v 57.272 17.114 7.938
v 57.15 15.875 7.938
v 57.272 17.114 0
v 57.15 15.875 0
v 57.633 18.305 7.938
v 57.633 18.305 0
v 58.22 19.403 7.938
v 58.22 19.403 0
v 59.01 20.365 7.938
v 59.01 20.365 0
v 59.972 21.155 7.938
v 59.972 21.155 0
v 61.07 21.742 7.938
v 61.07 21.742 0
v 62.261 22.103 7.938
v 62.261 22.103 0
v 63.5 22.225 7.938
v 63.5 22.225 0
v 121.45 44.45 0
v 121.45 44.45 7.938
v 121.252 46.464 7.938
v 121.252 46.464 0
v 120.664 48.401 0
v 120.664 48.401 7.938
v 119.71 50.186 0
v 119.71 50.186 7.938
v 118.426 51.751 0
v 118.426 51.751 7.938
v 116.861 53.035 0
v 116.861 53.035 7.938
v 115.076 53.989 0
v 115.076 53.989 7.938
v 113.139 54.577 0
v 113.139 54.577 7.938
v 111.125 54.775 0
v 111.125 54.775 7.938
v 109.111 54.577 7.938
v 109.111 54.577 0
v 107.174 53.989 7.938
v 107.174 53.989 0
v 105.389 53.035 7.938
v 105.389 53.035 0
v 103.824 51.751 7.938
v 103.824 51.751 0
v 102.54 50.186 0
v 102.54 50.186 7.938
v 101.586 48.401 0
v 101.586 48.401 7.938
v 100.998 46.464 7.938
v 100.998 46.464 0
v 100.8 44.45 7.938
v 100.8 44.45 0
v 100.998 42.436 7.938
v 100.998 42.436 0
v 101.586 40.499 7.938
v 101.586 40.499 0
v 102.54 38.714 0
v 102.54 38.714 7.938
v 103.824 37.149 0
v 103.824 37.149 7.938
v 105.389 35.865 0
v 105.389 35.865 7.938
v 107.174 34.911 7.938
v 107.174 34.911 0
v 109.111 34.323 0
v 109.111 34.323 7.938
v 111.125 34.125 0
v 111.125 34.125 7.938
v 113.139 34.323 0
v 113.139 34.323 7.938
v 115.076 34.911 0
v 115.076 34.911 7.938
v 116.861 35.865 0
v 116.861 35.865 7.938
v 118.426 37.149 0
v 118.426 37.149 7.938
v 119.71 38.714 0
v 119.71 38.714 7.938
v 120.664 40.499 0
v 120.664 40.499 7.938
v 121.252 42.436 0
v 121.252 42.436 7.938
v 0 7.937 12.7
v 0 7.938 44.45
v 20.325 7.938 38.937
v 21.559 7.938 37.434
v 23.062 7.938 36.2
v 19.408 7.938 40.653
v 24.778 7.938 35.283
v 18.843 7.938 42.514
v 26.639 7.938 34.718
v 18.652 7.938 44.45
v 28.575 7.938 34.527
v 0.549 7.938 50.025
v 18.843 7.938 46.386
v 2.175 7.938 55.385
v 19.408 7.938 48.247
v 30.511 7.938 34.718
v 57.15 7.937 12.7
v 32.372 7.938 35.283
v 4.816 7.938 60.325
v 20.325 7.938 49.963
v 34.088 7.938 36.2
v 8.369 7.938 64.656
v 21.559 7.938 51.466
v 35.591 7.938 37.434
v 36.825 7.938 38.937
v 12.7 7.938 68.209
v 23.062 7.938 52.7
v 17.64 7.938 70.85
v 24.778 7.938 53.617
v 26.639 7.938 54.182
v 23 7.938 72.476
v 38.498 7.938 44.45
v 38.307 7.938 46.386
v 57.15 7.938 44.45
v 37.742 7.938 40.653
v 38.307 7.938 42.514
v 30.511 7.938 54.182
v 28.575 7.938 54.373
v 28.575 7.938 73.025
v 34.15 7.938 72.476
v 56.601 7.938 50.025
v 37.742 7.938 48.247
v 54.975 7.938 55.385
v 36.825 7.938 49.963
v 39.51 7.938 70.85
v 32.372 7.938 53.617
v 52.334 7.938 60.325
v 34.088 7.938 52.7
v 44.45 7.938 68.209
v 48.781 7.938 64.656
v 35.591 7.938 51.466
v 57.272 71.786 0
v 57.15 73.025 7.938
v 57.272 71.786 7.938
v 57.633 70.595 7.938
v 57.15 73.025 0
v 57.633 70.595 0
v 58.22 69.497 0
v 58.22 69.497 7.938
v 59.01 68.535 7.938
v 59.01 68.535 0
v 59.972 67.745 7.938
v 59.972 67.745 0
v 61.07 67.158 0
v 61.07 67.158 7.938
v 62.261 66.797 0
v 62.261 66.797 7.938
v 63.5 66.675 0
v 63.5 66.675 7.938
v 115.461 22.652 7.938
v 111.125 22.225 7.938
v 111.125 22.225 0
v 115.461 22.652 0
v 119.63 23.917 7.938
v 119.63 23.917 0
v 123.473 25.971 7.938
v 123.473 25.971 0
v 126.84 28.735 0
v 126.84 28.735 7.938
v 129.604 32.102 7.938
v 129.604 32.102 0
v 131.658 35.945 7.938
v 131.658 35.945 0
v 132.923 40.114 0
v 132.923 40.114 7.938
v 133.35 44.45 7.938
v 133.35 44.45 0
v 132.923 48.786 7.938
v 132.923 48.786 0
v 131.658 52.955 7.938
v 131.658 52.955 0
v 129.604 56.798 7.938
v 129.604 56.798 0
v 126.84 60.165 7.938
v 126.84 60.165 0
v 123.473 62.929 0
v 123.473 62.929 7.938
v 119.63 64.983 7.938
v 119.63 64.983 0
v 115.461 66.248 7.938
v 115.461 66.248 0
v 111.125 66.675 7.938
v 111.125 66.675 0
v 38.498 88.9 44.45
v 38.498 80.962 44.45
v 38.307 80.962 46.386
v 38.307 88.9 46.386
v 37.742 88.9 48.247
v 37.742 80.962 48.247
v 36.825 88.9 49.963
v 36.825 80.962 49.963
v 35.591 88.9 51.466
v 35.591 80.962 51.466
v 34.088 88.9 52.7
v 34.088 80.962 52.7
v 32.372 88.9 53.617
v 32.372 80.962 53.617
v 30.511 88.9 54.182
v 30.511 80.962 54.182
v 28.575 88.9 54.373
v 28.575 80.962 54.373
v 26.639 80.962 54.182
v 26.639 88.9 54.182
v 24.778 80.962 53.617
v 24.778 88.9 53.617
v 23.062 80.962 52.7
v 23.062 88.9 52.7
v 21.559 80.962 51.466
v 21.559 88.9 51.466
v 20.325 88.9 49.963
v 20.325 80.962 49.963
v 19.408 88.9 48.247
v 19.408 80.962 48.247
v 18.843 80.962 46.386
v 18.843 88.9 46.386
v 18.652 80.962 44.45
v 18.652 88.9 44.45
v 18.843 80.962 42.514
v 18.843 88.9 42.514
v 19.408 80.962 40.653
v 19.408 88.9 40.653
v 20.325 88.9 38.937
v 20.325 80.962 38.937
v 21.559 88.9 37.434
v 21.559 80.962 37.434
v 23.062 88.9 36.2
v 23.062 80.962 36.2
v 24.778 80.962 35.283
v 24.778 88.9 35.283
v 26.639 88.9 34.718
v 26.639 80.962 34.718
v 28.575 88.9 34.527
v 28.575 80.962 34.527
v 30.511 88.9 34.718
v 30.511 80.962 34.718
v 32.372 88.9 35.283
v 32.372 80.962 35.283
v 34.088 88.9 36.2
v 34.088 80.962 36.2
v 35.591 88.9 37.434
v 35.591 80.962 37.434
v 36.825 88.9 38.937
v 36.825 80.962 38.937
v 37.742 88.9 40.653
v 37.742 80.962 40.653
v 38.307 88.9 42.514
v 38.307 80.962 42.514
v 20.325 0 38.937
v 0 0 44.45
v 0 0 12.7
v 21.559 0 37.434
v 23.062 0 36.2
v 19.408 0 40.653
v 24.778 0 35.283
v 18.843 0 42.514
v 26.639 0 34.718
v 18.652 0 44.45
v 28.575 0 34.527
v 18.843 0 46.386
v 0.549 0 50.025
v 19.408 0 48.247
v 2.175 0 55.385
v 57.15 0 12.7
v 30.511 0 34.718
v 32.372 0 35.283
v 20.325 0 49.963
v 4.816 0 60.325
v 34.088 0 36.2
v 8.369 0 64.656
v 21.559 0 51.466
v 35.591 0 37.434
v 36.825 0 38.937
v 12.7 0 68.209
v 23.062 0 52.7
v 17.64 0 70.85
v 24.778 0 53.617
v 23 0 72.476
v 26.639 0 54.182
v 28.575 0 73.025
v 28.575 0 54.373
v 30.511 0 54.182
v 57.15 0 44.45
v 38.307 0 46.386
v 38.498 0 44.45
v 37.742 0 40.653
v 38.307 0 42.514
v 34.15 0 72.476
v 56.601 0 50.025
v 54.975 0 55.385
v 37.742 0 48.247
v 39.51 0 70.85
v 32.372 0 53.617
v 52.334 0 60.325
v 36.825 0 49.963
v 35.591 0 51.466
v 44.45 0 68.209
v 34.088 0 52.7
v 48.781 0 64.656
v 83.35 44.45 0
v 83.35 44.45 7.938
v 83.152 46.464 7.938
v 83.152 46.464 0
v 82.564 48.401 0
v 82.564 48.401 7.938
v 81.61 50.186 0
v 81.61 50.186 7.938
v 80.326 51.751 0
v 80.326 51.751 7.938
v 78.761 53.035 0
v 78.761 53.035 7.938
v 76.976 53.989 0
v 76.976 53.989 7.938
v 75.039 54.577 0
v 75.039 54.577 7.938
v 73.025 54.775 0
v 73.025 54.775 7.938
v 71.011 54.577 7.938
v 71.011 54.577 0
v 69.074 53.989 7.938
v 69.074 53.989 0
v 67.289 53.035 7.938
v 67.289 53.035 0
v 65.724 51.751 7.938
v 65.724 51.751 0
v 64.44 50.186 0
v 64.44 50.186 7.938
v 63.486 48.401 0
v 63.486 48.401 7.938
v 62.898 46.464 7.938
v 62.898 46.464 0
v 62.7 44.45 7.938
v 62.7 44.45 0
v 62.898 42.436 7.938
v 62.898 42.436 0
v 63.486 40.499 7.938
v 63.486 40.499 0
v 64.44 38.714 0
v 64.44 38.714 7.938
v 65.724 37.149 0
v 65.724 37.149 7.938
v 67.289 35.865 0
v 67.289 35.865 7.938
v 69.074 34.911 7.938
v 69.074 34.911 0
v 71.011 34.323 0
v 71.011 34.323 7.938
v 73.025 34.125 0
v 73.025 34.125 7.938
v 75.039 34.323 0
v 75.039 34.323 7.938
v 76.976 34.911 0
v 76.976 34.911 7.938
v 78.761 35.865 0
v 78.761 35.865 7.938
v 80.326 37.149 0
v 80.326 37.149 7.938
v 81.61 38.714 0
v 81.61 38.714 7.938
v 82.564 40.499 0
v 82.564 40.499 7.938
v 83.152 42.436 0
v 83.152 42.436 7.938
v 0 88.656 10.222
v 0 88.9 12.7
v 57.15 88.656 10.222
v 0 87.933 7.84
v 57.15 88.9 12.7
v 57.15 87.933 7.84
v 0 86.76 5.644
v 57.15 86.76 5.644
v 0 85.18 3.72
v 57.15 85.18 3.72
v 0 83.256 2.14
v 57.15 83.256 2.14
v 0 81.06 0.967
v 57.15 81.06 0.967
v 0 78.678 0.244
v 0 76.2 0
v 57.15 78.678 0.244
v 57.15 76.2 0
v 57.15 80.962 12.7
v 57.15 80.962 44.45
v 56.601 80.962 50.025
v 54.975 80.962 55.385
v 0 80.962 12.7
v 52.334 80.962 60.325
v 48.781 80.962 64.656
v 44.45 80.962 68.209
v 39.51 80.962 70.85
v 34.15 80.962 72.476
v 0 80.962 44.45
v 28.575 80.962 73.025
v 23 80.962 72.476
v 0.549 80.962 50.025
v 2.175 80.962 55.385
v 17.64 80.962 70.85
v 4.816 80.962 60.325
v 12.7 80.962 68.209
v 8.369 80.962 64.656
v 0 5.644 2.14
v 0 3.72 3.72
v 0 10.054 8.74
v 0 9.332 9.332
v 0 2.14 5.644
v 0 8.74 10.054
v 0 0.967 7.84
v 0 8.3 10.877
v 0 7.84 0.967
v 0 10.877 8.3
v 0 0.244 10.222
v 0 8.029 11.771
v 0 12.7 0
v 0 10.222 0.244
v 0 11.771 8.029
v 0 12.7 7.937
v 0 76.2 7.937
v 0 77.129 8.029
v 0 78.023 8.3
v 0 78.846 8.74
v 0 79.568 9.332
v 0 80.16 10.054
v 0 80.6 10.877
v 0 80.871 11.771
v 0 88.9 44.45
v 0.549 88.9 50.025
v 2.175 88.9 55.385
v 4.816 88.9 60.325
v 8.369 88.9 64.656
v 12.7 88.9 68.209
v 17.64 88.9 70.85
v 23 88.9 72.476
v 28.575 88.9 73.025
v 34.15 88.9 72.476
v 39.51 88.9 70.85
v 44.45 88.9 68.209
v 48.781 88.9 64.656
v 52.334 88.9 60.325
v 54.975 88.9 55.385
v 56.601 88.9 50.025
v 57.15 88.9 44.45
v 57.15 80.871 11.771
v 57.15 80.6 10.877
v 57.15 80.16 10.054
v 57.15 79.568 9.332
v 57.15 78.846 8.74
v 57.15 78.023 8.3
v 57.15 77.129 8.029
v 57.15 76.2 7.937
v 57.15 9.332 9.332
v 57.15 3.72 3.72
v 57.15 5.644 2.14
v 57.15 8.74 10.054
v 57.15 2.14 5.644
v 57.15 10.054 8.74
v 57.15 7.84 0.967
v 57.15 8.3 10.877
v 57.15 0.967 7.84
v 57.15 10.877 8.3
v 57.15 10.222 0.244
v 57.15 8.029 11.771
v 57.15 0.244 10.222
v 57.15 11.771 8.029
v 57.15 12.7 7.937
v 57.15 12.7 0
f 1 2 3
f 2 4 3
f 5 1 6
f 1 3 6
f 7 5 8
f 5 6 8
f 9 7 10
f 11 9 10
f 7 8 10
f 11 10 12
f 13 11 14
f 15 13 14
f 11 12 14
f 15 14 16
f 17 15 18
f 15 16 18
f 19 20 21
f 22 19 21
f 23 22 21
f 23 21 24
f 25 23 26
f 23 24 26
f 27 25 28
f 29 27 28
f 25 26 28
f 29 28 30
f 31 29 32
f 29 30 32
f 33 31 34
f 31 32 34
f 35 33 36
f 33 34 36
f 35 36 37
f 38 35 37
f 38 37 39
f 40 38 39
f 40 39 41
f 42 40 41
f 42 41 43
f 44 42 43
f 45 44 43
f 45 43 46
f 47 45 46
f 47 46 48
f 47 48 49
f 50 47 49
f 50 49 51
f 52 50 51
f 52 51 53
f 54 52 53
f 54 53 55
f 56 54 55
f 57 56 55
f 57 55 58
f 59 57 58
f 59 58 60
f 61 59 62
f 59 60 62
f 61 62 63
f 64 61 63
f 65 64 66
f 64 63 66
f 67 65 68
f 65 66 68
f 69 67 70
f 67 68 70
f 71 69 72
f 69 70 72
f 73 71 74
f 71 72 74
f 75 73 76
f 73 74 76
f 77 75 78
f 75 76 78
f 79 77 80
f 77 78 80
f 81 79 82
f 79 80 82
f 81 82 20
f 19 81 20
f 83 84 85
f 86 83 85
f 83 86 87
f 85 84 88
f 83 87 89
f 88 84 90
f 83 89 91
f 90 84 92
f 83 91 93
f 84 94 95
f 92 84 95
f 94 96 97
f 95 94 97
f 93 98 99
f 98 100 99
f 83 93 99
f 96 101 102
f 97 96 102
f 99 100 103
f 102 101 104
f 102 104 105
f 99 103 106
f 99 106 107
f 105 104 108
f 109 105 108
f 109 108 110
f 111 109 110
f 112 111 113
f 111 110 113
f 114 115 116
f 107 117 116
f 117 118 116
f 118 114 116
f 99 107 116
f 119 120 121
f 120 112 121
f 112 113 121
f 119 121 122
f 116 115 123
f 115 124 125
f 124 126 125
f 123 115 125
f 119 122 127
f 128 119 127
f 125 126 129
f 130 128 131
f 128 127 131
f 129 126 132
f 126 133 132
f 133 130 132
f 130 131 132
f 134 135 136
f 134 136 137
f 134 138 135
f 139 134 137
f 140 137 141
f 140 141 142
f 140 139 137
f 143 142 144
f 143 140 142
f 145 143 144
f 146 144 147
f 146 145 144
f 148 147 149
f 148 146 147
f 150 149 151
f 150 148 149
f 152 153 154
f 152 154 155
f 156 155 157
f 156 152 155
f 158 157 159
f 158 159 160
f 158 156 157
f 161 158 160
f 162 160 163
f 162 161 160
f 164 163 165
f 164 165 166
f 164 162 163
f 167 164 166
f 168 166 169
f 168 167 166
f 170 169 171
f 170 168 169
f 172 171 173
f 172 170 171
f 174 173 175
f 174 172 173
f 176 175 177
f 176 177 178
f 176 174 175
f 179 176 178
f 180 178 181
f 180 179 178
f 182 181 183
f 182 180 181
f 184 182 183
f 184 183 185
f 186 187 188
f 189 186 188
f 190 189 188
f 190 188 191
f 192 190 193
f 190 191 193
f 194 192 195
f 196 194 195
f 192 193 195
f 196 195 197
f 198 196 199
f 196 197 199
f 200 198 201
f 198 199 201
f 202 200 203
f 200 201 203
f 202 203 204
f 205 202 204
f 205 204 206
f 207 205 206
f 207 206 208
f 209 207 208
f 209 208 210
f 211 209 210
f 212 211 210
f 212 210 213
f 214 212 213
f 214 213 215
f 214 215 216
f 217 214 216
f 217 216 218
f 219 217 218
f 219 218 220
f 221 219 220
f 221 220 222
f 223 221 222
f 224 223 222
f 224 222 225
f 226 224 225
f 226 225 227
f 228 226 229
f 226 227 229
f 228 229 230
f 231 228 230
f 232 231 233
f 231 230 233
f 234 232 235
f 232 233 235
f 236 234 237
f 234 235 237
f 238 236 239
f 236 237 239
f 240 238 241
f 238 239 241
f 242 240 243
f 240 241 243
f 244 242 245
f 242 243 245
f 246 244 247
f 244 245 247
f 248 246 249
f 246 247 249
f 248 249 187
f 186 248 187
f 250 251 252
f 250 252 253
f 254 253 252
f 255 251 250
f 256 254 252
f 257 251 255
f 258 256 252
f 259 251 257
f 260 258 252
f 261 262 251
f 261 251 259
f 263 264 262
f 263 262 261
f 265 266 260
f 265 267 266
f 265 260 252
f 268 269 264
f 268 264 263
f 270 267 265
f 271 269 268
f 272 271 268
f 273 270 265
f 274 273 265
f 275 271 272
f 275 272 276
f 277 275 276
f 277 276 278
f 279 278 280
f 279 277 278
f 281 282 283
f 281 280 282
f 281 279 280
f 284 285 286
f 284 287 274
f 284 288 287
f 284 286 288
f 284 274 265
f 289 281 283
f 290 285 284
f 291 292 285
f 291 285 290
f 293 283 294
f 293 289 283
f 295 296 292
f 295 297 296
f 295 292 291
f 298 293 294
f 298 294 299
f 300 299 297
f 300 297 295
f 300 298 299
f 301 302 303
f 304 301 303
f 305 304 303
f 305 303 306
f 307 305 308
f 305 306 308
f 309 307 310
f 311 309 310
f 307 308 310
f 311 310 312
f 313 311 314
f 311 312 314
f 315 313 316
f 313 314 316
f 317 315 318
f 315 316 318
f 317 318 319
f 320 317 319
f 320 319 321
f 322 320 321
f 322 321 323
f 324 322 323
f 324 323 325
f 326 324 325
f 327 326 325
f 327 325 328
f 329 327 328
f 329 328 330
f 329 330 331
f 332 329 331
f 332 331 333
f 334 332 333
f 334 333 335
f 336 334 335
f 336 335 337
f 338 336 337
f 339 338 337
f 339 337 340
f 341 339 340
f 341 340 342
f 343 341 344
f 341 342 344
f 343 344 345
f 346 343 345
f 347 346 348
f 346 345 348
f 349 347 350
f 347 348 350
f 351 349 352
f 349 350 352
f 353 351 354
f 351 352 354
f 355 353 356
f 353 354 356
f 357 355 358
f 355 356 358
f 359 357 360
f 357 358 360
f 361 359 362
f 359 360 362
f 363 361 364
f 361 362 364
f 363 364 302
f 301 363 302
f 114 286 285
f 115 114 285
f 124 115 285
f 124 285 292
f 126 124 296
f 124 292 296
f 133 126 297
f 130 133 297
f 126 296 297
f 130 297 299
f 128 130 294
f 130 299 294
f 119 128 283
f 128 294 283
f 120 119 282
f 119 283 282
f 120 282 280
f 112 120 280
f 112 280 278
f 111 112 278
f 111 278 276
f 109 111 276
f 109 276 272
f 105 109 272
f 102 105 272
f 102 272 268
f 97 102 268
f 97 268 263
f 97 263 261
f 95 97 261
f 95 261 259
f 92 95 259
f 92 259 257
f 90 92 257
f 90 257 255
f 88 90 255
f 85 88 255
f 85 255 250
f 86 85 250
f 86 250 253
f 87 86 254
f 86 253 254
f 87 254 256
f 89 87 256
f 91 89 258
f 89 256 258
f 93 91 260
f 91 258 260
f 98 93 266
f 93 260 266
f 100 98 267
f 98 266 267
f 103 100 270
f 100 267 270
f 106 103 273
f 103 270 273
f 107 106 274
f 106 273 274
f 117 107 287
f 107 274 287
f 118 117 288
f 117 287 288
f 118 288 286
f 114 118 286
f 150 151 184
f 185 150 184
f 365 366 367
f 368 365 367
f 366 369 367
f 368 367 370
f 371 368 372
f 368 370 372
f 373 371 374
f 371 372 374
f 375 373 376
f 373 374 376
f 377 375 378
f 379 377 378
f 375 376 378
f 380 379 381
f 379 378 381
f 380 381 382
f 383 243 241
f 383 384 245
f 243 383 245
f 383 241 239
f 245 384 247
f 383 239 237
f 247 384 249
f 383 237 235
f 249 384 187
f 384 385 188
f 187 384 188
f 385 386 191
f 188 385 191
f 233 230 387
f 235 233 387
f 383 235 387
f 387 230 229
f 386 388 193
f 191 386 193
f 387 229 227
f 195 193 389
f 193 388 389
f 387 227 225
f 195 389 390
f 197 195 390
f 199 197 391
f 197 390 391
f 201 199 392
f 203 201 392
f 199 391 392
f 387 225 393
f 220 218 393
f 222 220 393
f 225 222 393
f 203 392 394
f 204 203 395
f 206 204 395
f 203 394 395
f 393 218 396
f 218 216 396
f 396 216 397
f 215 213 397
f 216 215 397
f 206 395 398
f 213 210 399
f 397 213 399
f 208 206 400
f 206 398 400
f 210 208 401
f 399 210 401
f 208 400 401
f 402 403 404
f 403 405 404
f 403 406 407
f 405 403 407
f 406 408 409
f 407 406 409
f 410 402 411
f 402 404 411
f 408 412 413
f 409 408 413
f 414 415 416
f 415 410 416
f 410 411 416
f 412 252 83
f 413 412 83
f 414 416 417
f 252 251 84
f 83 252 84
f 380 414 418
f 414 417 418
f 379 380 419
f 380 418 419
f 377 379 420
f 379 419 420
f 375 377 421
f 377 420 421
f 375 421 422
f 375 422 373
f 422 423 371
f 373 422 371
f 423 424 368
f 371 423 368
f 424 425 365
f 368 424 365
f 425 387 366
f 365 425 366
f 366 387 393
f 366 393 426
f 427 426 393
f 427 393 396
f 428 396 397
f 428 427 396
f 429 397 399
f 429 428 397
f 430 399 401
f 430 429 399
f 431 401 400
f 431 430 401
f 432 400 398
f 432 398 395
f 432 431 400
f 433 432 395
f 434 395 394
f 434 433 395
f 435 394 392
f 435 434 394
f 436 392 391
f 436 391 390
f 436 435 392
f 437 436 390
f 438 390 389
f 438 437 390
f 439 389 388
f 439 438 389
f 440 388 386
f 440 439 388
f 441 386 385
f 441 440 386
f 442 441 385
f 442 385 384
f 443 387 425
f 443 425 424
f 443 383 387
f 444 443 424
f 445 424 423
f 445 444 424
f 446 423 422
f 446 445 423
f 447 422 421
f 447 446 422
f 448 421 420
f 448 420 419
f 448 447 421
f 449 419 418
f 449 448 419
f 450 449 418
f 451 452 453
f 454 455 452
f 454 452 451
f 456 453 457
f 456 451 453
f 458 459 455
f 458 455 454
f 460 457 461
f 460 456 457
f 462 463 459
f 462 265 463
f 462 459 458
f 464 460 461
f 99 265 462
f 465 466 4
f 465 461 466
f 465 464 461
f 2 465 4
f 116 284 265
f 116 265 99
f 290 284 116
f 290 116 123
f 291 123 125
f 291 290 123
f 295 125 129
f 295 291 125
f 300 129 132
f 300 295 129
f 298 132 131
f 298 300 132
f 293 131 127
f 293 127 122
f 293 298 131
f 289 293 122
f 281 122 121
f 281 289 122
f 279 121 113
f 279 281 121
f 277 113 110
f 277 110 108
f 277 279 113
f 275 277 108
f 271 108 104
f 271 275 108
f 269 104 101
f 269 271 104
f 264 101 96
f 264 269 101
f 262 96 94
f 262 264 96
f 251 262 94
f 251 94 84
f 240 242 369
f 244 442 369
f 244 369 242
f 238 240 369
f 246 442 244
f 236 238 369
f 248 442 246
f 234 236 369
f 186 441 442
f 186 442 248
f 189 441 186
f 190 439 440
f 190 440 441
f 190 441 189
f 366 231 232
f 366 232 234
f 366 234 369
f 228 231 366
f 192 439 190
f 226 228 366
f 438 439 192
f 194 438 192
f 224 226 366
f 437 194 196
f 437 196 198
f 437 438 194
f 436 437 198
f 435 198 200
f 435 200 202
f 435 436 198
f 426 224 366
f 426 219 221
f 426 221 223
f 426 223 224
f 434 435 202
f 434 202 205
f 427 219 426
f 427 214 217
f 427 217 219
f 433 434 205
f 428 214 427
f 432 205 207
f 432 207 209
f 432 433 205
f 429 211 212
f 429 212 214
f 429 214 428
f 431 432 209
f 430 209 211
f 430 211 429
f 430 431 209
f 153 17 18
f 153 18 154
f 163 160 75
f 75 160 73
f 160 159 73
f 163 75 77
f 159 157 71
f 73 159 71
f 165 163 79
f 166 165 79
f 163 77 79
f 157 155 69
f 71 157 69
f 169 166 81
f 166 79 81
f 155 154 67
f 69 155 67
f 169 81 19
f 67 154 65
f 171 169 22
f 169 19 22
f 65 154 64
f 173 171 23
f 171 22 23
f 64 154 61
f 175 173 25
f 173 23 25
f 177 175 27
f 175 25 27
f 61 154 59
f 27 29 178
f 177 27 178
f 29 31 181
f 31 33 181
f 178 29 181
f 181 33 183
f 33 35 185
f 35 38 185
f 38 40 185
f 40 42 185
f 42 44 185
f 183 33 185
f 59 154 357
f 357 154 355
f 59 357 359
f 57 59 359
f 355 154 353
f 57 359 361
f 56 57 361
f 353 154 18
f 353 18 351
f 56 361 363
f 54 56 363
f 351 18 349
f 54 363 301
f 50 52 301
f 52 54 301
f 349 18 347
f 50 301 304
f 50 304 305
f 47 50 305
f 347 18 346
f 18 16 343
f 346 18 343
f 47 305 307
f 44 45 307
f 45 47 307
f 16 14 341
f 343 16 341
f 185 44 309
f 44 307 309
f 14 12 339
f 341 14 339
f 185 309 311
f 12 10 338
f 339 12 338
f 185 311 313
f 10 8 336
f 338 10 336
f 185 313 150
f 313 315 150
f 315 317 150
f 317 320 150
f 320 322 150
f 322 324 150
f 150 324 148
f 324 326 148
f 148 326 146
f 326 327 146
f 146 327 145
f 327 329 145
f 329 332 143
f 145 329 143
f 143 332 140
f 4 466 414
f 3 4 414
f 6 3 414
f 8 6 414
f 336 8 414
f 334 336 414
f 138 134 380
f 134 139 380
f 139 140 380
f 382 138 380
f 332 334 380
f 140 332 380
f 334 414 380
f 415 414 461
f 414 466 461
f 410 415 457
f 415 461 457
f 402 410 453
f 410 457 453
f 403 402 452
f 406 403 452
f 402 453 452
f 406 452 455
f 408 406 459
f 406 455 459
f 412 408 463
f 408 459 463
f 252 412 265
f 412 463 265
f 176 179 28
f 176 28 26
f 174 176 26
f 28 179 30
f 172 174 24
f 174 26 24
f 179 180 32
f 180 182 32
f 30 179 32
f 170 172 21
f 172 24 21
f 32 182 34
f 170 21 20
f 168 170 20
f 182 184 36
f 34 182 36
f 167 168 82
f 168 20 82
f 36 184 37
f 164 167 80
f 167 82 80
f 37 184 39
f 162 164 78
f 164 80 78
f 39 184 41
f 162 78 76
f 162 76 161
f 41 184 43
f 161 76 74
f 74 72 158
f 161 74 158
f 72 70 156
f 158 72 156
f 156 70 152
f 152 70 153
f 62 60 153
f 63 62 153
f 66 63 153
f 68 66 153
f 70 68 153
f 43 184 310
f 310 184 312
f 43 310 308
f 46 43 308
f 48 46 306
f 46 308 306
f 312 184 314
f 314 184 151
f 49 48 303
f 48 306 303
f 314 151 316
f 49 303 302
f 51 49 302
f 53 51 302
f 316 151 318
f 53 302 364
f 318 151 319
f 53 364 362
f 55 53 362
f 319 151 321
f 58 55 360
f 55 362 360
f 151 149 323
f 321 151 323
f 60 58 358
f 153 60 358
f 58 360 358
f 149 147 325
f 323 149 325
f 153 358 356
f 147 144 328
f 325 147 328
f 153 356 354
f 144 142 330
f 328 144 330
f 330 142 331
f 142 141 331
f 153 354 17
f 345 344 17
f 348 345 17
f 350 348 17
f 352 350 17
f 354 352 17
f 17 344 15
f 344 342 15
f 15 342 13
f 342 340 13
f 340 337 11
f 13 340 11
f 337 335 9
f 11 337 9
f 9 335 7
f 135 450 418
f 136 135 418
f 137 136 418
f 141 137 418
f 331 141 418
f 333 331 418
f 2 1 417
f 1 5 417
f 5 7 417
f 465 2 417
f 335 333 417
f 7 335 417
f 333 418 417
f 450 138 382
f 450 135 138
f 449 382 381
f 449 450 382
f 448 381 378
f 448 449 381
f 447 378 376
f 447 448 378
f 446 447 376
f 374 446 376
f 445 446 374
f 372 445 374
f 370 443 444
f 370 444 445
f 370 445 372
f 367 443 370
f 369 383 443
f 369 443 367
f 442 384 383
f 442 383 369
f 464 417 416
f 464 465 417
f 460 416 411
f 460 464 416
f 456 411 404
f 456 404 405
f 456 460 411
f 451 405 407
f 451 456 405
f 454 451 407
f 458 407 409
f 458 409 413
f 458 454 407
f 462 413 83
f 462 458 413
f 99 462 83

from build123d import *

# Parameters (mm, degrees)
F1_DEPTH  = 57.15
F3_DEPTH  = 7.9375
F5_DEPTH  = 7.9375
F6_R      = 9.92251
F7_DEPTH  = 88.901
F8_W      = 53.975
F8_H      = 44.45
F9_DEPTH  = 7.9375
F10_R     = 10.3251
F11_DEPTH = 7.9385
F12_R     = 4.7625
F13_R     = 12.7
F14_R     = 6.35


with BuildPart() as f1:
    # F0 (on Right) → F1 (new body)
    with BuildSketch(Plane.YZ):
        Polygon((0, 44.45), (0, 0), (88.9, 0), (88.9, 44.45), (80.9625, 44.45), (80.9625, 7.9375), (7.9375, 7.9375), (7.9375, 44.45), align=None)
    extrude(amount=F1_DEPTH)

    # F2 (on face) → F3 (join)
    with BuildSketch(Plane.XZ):
        with BuildLine():
            Line((0, 44.45), (57.15, 44.45))
            ThreePointArc((57.15, 44.45), (28.575, 73.025), (0, 44.45))
        make_face()
    extrude(amount=-F3_DEPTH)

    # F4 (on face) → F5 (join)
    with BuildSketch(Plane(origin=(0, 88.9, 0), x_dir=(-1, 0, 0), z_dir=(0, 1, 0))):
        with BuildLine():
            Line((-57.15, 44.45), (0, 44.45))
            ThreePointArc((0, 44.45), (-28.575, 73.025), (-57.15, 44.45))
        make_face()
    extrude(amount=-F5_DEPTH)

    # F6 (on face) → F7 (cut, through all)
    with BuildSketch(Plane.XZ):
        with Locations((28.575, 44.45)):
            Circle(F6_R)
    extrude(amount=-F7_DEPTH, mode=Mode.SUBTRACT)

    # F8 (on face) → F9 (join)
    with BuildSketch(Plane.XY.offset(7.9375)):
        with Locations((84.1375, 44.45)):
            Rectangle(F8_W, F8_H)
        with BuildLine():
            Line((111.125, 66.675), (111.125, 22.225))
            ThreePointArc((111.125, 22.225), (133.35, 44.45), (111.125, 66.675))
        make_face()
    extrude(amount=-F9_DEPTH)

    # F10 (on face) → F11 (cut, through all)
    with BuildSketch(Plane.XY.offset(7.9375)):
        with Locations((73.025, 44.45)):
            Circle(F10_R)
        with Locations((111.125, 44.45)):
            Circle(F10_R)
    extrude(amount=-F11_DEPTH, mode=Mode.SUBTRACT)

    # F12
    f12_edges = [f1.edges().sort_by_distance(p)[0] for p in [
        (28.575, 80.9625, 7.9375),
        (28.575, 7.9375, 7.9375),
    ]]
    fillet(f12_edges, radius=F12_R)

    # F13
    f13_edges = [f1.edges().sort_by_distance(p)[0] for p in [
        (28.575, 0, 0),
        (28.575, 88.9, 0),
    ]]
    fillet(f13_edges, radius=F13_R)

    # F14
    f14_edges = [f1.edges().sort_by_distance(p)[0] for p in [
        (57.15, 66.675, 3.96875),
        (57.15, 22.225, 3.96875),
    ]]
    fillet(f14_edges, radius=F14_R)


solid = f1.part
